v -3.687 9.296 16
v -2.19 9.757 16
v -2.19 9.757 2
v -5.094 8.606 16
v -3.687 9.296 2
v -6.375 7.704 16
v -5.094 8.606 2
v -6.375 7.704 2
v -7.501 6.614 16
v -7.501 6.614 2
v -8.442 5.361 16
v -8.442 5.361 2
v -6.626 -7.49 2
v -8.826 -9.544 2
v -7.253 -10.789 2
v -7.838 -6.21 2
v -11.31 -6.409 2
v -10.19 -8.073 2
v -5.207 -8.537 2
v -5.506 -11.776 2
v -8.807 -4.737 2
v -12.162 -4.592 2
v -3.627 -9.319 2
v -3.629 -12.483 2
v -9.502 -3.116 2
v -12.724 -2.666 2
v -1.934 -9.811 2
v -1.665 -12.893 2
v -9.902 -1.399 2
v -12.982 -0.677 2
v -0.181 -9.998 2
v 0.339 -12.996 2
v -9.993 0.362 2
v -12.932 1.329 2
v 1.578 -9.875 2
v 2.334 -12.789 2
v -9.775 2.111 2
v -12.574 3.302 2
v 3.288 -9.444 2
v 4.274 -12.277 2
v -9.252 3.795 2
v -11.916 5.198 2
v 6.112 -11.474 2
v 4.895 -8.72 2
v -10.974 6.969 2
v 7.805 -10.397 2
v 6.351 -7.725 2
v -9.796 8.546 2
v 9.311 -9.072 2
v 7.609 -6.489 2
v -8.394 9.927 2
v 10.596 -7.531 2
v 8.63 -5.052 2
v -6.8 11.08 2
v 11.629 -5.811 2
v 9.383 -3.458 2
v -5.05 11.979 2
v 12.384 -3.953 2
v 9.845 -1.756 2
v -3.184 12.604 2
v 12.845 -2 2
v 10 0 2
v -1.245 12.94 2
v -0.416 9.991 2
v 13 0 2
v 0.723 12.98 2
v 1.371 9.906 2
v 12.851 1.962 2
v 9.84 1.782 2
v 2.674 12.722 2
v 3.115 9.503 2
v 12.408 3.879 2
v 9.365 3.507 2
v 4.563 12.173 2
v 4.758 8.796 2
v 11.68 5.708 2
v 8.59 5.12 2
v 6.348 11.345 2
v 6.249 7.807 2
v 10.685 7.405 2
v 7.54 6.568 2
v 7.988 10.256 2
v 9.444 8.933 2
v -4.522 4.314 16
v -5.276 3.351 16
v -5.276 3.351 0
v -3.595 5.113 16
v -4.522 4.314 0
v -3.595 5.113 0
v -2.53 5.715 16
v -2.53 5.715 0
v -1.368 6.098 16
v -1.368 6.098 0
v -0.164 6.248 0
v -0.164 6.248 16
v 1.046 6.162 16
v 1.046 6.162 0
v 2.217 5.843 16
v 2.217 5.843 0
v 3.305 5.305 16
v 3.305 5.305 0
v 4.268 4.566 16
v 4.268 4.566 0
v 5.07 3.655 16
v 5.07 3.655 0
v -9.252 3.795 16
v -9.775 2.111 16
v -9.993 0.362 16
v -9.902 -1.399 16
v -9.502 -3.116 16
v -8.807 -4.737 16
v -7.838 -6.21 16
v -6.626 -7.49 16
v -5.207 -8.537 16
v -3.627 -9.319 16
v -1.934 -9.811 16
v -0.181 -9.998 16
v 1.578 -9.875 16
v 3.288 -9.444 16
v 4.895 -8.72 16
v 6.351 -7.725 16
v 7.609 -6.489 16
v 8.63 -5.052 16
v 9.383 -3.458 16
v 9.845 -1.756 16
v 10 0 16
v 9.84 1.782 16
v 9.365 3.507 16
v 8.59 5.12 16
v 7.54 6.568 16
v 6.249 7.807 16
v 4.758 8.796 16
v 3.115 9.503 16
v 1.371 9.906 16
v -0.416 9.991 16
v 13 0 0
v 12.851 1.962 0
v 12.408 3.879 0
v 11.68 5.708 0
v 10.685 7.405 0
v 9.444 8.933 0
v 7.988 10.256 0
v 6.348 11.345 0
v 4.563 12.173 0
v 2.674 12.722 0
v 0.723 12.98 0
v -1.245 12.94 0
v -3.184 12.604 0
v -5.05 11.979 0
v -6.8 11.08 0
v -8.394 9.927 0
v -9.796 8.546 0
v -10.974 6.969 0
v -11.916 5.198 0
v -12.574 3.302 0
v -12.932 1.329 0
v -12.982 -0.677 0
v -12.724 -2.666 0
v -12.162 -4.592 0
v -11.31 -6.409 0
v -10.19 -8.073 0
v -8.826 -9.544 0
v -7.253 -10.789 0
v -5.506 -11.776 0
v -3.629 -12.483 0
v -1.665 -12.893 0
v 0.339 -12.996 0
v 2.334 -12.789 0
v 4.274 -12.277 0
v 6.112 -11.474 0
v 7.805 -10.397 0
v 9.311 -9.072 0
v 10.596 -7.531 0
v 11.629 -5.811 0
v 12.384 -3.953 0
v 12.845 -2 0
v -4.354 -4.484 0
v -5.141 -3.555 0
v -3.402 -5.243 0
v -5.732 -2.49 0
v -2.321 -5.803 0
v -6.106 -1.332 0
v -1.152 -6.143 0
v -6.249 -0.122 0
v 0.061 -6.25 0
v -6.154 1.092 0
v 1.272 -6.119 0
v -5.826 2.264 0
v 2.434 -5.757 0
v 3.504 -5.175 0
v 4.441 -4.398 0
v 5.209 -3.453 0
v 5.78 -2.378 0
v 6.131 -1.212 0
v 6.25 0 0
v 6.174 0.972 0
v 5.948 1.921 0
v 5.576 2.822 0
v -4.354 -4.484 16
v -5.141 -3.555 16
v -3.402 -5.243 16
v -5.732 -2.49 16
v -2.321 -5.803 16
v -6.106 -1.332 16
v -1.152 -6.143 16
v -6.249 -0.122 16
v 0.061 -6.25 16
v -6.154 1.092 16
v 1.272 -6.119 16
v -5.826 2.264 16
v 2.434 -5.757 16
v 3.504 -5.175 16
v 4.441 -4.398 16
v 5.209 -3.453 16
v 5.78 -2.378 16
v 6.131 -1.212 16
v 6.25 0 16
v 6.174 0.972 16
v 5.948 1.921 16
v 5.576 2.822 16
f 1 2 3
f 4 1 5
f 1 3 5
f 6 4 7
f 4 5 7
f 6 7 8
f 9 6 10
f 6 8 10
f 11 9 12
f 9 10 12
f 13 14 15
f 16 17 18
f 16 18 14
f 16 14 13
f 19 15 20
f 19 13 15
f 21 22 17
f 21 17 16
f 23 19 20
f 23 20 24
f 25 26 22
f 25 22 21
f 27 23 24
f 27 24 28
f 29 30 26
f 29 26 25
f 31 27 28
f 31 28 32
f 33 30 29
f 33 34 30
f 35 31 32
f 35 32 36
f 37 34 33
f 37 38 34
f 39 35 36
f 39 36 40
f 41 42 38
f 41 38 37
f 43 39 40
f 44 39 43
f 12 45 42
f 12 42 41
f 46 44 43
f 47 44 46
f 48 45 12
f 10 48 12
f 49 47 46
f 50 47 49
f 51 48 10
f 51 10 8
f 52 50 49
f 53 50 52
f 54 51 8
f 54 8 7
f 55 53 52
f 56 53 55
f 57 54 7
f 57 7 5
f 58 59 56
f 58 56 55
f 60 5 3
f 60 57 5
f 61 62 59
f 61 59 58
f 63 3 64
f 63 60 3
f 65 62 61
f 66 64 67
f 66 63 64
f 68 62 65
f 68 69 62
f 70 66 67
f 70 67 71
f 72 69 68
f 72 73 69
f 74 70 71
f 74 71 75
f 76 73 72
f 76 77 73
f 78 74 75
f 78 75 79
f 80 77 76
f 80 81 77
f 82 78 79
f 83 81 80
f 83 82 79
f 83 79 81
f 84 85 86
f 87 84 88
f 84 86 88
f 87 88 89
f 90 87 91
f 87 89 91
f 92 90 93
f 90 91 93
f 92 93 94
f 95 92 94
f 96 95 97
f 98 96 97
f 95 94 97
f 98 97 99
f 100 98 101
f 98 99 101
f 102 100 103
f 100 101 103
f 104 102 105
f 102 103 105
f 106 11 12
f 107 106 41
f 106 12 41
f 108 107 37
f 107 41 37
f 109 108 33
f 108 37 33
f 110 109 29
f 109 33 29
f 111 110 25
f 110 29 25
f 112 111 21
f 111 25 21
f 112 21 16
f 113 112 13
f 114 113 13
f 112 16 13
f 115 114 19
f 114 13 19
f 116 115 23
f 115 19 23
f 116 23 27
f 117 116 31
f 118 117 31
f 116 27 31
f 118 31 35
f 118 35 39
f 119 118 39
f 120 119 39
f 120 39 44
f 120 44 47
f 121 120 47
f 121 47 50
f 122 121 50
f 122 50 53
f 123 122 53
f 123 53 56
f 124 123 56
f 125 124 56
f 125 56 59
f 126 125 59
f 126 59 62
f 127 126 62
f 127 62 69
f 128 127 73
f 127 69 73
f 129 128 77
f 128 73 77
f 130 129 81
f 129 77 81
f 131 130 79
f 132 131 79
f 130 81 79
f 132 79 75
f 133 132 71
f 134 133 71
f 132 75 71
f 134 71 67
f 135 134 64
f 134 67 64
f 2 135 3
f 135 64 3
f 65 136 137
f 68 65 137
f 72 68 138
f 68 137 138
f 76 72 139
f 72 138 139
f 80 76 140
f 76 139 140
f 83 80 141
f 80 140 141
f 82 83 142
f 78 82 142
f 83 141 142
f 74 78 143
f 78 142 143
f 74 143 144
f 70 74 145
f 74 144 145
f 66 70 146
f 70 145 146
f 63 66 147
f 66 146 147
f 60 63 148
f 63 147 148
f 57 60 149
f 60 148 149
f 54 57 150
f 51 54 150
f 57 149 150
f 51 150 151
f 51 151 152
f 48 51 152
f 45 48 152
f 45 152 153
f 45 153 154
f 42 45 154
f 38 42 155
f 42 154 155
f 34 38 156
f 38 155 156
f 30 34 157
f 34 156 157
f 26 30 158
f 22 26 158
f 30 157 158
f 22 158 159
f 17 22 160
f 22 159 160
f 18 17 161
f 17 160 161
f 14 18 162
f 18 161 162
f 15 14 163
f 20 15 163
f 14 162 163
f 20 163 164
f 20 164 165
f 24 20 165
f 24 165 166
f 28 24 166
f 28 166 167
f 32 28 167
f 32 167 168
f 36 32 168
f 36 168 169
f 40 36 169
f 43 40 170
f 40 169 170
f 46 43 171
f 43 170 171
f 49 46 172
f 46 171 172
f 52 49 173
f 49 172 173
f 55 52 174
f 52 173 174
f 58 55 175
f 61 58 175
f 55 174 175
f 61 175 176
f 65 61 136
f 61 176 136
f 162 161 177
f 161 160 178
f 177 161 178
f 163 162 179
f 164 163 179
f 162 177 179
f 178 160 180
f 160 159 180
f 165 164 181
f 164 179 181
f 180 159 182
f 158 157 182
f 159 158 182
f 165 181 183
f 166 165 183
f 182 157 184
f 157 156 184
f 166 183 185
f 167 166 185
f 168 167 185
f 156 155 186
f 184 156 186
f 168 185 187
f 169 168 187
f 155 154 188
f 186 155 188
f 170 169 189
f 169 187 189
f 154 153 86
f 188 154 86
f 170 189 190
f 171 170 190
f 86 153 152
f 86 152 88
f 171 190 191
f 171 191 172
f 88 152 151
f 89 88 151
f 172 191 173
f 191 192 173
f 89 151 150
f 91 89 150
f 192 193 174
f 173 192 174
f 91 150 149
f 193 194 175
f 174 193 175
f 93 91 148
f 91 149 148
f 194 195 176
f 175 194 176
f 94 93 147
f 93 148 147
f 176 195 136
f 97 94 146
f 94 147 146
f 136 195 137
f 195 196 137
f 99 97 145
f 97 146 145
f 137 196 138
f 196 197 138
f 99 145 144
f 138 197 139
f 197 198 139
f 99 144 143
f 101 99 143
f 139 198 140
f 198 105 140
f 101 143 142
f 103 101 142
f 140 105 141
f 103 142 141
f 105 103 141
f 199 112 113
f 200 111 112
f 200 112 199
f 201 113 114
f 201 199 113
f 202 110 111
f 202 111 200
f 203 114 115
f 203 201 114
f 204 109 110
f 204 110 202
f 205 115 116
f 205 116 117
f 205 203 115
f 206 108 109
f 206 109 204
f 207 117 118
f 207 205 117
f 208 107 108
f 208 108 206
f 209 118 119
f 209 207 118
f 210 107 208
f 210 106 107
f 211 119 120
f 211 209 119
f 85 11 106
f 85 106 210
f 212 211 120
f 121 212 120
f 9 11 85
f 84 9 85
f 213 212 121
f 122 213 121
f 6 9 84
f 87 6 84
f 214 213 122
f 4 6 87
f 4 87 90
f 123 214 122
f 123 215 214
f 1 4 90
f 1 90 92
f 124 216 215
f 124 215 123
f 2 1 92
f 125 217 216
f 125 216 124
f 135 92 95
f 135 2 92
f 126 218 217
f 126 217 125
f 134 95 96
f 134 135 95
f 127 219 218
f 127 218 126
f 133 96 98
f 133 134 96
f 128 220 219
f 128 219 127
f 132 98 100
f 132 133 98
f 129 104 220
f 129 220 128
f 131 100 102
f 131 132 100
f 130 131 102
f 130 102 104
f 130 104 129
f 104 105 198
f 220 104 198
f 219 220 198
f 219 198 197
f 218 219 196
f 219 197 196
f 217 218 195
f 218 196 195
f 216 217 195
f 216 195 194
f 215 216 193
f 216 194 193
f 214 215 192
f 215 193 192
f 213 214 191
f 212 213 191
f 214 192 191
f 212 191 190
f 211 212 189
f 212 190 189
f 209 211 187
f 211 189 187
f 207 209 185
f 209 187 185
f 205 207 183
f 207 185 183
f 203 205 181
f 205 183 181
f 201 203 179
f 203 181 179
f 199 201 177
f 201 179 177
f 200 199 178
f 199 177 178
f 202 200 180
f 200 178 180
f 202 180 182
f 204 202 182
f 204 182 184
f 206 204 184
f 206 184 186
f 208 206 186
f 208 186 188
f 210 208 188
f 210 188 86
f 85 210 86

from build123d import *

# Parameters (mm, degrees)
F1_DEPTH = 2
F2_DEPTH = 16


with BuildPart() as f1:
    # F0 (on Top) → F1 (new body)
    with BuildSketch(Plane.XY):
        with BuildLine():
            ThreePointArc((13, 0), (3.628848584, 12.4832470918), (-10.9740704545, 6.969202082))
            ThreePointArc((-10.9740704545, 6.969202082), (-3.628848584, -12.4832470918), (13, 0))
        make_face()
        with BuildLine():
            ThreePointArc((10, 0), (-2.7914219877, -9.6024977629), (-8.4415926573, 5.3609246784))
            ThreePointArc((-8.4415926573, 5.3609246784), (-5.7521539146, 8.1800198865), (-2.1895164333, 9.7573571108))
            ThreePointArc((-2.1895164333, 9.7573571108), (6.2491933746, 7.8068932468), (10, 0))
        make_face(mode=Mode.SUBTRACT)
    extrude(amount=F1_DEPTH)

    # F0 (on Top) → F2 (join)
    with BuildSketch(Plane.XY):
        with BuildLine():
            ThreePointArc((-1.3684477708, 6.0983481943), (2.2173687229, 5.8434387091), (5.0696124466, 3.6553426161))
            ThreePointArc((5.0696124466, 3.6553426161), (5.9475868128, 1.9206017558), (6.25, 0))
            ThreePointArc((6.25, 0), (-1.7446387423, -6.0015611018), (-5.2759954108, 3.350577924))
            Line((-5.2759954108, 3.350577924), (-8.4415926573, 5.3609246784))
            ThreePointArc((-8.4415926573, 5.3609246784), (-2.7914219877, -9.6024977629), (10, 0))
            ThreePointArc((10, 0), (6.2491933746, 7.8068932468), (-2.1895164333, 9.7573571108))
            Line((-2.1895164333, 9.7573571108), (-1.3684477708, 6.0983481943))
        make_face()
        with BuildLine():
            Line((-8.4415926573, 5.3609246784), (-5.2759954108, 3.350577924))
            ThreePointArc((-5.2759954108, 3.350577924), (-3.5950961966, 5.112512429), (-1.3684477708, 6.0983481943))
            Line((-1.3684477708, 6.0983481943), (-2.1895164333, 9.7573571108))
            ThreePointArc((-2.1895164333, 9.7573571108), (-5.7521539146, 8.1800198865), (-8.4415926573, 5.3609246784))
        make_face()
    extrude(amount=F2_DEPTH)


solid = f1.part
